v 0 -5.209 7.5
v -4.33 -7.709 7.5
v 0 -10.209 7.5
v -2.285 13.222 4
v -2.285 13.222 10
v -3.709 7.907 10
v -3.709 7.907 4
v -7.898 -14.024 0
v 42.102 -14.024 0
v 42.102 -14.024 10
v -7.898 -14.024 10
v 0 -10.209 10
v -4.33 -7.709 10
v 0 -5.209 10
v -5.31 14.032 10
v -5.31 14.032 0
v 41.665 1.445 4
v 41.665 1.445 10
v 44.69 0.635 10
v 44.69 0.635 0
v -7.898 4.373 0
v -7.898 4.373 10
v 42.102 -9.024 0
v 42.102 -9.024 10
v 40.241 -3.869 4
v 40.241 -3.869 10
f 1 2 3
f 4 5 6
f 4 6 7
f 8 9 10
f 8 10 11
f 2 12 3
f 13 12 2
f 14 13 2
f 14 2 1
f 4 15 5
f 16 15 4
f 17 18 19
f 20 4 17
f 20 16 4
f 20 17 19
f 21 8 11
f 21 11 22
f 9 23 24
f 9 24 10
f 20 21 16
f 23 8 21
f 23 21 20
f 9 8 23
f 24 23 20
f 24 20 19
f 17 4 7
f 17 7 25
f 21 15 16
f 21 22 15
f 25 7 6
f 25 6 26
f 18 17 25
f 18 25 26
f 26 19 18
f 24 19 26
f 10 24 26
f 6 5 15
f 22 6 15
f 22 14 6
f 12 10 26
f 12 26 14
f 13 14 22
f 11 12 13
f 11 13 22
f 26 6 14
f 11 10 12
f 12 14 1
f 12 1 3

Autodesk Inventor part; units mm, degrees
ref_plane "YZ Plane" through (0, 0, 0) normal (1, 0, 0) x (0, 1, 0)
ref_plane "XZ Plane" through (0, 0, 0) normal (0, 1, 0) x (-1, 0, 0)
ref_plane "XY Plane" through (0, 0, 0) normal (0, 0, 1) x (1, 0, 0)
sketch "Sketch1" plane through (0, 0, 0) normal (0, 0, 1) x (1, 0, 0)
  line L0 (-7.898, 5.9756) -> (42.102, 5.9756)
  line L1 (42.102, 5.9756) -> (42.102, -14.0244)
  line L2 (42.102, -14.0244) -> (-7.898, -14.0244)
  line L3 (-7.898, -14.0244) -> (-7.898, 5.9756)
  point P0 (0, 0)
  dimension "d0" = 50
  dimension "d1" = 20
extrude "Extrusion1" add sketch "Sketch1" along normal blind 10
sketch "Sketch2" plane through (0, 0, 10) normal (0, 0, 1) x (1, 0, 0)
  line L0 (-7.898, 5.9756) -> (-7.898, -14.0244) projected
  line L1 (-7.898, 4.3731) -> (42.102, -9.0244)
  line L2 (42.102, -14.0244) -> (42.102, 5.9756) projected
  line L3 (-7.898, 4.3731) -> (-7.898, 5.9756)
  line L4 (42.102, 5.9756) -> (-7.898, 5.9756) projected
  line L5 (42.102, 5.9756) -> (42.102, -9.0244)
  point P0 (0, 0)
  dimension "d4" = 5
  dimension "d5" = 75
extrude "Extrusion2" cut sketch "Sketch2" against normal up to surface (10 mm away)
sketch "Sketch3" plane through (-7.898, 4.3731, 10) normal (0.258819, 0.9659258, 0) x (0.9659258, -0.258819, 0)
  line L0 (53.0579, 0) -> (51.7638, 0) projected
  line L1 (0, 10) -> (4.7616, 10) projected
  line L2 (51.7638, 0) -> (0, 0)
  line L3 (0, 0) -> (0, 10)
  line L4 (0, 10) -> (51.7638, 10)
  line L5 (51.7638, 10) -> (51.7638, 0)
  point P0 (8.7608, 10)
extrude "Extrusion3" add sketch "Sketch3" along normal blind 10
sketch "Sketch4" plane through (-5.3099, 14.0324, 10) normal (0.258819, 0.9659258, 0) x (0.9659258, -0.258819, 0)
  line L0 (48.632, 0) -> (3.132, 0)
  line L1 (3.132, 0) -> (3.132, 6)
  line L2 (3.132, 6) -> (48.632, 6)
  line L3 (48.632, 6) -> (48.632, 0)
  line L4 (0, 0) -> (51.7638, 0) projected
  line L5 (0, 10) -> (0, 0) projected
  line L6 (51.7638, 10) -> (0, 10) projected
  point P0 (8.7608, 10)
  point P1 (25.882, 5)
  dimension "d10" = 45.5
  dimension "d11" = 6
  dimension "d13" = 25.882
  dimension "d14" = 22.75
  dimension "d23" = 0
extrude "Extrusion4" cut sketch "Sketch4" against normal blind 5.5
sketch "Sketch5" plane through (0, 0, 10) normal (0, 0, 1) x (1, 0, 0)
  line L0 (0, -5.2088) -> (0, -10.2088)
  line L1 (0, -10.2088) -> (-4.3301, -7.7088)
  line L2 (-4.3301, -7.7088) -> (0, -5.2088)
  point P0 (0, 0)
  dimension "d17" = 5
  dimension "d18" = 5
extrude "Extrusion5" cut sketch "Sketch5" against normal blind 2.5
equation "\"d14\" = 0.5 * d10"
properties part number "Angled Base AdapterFront"
